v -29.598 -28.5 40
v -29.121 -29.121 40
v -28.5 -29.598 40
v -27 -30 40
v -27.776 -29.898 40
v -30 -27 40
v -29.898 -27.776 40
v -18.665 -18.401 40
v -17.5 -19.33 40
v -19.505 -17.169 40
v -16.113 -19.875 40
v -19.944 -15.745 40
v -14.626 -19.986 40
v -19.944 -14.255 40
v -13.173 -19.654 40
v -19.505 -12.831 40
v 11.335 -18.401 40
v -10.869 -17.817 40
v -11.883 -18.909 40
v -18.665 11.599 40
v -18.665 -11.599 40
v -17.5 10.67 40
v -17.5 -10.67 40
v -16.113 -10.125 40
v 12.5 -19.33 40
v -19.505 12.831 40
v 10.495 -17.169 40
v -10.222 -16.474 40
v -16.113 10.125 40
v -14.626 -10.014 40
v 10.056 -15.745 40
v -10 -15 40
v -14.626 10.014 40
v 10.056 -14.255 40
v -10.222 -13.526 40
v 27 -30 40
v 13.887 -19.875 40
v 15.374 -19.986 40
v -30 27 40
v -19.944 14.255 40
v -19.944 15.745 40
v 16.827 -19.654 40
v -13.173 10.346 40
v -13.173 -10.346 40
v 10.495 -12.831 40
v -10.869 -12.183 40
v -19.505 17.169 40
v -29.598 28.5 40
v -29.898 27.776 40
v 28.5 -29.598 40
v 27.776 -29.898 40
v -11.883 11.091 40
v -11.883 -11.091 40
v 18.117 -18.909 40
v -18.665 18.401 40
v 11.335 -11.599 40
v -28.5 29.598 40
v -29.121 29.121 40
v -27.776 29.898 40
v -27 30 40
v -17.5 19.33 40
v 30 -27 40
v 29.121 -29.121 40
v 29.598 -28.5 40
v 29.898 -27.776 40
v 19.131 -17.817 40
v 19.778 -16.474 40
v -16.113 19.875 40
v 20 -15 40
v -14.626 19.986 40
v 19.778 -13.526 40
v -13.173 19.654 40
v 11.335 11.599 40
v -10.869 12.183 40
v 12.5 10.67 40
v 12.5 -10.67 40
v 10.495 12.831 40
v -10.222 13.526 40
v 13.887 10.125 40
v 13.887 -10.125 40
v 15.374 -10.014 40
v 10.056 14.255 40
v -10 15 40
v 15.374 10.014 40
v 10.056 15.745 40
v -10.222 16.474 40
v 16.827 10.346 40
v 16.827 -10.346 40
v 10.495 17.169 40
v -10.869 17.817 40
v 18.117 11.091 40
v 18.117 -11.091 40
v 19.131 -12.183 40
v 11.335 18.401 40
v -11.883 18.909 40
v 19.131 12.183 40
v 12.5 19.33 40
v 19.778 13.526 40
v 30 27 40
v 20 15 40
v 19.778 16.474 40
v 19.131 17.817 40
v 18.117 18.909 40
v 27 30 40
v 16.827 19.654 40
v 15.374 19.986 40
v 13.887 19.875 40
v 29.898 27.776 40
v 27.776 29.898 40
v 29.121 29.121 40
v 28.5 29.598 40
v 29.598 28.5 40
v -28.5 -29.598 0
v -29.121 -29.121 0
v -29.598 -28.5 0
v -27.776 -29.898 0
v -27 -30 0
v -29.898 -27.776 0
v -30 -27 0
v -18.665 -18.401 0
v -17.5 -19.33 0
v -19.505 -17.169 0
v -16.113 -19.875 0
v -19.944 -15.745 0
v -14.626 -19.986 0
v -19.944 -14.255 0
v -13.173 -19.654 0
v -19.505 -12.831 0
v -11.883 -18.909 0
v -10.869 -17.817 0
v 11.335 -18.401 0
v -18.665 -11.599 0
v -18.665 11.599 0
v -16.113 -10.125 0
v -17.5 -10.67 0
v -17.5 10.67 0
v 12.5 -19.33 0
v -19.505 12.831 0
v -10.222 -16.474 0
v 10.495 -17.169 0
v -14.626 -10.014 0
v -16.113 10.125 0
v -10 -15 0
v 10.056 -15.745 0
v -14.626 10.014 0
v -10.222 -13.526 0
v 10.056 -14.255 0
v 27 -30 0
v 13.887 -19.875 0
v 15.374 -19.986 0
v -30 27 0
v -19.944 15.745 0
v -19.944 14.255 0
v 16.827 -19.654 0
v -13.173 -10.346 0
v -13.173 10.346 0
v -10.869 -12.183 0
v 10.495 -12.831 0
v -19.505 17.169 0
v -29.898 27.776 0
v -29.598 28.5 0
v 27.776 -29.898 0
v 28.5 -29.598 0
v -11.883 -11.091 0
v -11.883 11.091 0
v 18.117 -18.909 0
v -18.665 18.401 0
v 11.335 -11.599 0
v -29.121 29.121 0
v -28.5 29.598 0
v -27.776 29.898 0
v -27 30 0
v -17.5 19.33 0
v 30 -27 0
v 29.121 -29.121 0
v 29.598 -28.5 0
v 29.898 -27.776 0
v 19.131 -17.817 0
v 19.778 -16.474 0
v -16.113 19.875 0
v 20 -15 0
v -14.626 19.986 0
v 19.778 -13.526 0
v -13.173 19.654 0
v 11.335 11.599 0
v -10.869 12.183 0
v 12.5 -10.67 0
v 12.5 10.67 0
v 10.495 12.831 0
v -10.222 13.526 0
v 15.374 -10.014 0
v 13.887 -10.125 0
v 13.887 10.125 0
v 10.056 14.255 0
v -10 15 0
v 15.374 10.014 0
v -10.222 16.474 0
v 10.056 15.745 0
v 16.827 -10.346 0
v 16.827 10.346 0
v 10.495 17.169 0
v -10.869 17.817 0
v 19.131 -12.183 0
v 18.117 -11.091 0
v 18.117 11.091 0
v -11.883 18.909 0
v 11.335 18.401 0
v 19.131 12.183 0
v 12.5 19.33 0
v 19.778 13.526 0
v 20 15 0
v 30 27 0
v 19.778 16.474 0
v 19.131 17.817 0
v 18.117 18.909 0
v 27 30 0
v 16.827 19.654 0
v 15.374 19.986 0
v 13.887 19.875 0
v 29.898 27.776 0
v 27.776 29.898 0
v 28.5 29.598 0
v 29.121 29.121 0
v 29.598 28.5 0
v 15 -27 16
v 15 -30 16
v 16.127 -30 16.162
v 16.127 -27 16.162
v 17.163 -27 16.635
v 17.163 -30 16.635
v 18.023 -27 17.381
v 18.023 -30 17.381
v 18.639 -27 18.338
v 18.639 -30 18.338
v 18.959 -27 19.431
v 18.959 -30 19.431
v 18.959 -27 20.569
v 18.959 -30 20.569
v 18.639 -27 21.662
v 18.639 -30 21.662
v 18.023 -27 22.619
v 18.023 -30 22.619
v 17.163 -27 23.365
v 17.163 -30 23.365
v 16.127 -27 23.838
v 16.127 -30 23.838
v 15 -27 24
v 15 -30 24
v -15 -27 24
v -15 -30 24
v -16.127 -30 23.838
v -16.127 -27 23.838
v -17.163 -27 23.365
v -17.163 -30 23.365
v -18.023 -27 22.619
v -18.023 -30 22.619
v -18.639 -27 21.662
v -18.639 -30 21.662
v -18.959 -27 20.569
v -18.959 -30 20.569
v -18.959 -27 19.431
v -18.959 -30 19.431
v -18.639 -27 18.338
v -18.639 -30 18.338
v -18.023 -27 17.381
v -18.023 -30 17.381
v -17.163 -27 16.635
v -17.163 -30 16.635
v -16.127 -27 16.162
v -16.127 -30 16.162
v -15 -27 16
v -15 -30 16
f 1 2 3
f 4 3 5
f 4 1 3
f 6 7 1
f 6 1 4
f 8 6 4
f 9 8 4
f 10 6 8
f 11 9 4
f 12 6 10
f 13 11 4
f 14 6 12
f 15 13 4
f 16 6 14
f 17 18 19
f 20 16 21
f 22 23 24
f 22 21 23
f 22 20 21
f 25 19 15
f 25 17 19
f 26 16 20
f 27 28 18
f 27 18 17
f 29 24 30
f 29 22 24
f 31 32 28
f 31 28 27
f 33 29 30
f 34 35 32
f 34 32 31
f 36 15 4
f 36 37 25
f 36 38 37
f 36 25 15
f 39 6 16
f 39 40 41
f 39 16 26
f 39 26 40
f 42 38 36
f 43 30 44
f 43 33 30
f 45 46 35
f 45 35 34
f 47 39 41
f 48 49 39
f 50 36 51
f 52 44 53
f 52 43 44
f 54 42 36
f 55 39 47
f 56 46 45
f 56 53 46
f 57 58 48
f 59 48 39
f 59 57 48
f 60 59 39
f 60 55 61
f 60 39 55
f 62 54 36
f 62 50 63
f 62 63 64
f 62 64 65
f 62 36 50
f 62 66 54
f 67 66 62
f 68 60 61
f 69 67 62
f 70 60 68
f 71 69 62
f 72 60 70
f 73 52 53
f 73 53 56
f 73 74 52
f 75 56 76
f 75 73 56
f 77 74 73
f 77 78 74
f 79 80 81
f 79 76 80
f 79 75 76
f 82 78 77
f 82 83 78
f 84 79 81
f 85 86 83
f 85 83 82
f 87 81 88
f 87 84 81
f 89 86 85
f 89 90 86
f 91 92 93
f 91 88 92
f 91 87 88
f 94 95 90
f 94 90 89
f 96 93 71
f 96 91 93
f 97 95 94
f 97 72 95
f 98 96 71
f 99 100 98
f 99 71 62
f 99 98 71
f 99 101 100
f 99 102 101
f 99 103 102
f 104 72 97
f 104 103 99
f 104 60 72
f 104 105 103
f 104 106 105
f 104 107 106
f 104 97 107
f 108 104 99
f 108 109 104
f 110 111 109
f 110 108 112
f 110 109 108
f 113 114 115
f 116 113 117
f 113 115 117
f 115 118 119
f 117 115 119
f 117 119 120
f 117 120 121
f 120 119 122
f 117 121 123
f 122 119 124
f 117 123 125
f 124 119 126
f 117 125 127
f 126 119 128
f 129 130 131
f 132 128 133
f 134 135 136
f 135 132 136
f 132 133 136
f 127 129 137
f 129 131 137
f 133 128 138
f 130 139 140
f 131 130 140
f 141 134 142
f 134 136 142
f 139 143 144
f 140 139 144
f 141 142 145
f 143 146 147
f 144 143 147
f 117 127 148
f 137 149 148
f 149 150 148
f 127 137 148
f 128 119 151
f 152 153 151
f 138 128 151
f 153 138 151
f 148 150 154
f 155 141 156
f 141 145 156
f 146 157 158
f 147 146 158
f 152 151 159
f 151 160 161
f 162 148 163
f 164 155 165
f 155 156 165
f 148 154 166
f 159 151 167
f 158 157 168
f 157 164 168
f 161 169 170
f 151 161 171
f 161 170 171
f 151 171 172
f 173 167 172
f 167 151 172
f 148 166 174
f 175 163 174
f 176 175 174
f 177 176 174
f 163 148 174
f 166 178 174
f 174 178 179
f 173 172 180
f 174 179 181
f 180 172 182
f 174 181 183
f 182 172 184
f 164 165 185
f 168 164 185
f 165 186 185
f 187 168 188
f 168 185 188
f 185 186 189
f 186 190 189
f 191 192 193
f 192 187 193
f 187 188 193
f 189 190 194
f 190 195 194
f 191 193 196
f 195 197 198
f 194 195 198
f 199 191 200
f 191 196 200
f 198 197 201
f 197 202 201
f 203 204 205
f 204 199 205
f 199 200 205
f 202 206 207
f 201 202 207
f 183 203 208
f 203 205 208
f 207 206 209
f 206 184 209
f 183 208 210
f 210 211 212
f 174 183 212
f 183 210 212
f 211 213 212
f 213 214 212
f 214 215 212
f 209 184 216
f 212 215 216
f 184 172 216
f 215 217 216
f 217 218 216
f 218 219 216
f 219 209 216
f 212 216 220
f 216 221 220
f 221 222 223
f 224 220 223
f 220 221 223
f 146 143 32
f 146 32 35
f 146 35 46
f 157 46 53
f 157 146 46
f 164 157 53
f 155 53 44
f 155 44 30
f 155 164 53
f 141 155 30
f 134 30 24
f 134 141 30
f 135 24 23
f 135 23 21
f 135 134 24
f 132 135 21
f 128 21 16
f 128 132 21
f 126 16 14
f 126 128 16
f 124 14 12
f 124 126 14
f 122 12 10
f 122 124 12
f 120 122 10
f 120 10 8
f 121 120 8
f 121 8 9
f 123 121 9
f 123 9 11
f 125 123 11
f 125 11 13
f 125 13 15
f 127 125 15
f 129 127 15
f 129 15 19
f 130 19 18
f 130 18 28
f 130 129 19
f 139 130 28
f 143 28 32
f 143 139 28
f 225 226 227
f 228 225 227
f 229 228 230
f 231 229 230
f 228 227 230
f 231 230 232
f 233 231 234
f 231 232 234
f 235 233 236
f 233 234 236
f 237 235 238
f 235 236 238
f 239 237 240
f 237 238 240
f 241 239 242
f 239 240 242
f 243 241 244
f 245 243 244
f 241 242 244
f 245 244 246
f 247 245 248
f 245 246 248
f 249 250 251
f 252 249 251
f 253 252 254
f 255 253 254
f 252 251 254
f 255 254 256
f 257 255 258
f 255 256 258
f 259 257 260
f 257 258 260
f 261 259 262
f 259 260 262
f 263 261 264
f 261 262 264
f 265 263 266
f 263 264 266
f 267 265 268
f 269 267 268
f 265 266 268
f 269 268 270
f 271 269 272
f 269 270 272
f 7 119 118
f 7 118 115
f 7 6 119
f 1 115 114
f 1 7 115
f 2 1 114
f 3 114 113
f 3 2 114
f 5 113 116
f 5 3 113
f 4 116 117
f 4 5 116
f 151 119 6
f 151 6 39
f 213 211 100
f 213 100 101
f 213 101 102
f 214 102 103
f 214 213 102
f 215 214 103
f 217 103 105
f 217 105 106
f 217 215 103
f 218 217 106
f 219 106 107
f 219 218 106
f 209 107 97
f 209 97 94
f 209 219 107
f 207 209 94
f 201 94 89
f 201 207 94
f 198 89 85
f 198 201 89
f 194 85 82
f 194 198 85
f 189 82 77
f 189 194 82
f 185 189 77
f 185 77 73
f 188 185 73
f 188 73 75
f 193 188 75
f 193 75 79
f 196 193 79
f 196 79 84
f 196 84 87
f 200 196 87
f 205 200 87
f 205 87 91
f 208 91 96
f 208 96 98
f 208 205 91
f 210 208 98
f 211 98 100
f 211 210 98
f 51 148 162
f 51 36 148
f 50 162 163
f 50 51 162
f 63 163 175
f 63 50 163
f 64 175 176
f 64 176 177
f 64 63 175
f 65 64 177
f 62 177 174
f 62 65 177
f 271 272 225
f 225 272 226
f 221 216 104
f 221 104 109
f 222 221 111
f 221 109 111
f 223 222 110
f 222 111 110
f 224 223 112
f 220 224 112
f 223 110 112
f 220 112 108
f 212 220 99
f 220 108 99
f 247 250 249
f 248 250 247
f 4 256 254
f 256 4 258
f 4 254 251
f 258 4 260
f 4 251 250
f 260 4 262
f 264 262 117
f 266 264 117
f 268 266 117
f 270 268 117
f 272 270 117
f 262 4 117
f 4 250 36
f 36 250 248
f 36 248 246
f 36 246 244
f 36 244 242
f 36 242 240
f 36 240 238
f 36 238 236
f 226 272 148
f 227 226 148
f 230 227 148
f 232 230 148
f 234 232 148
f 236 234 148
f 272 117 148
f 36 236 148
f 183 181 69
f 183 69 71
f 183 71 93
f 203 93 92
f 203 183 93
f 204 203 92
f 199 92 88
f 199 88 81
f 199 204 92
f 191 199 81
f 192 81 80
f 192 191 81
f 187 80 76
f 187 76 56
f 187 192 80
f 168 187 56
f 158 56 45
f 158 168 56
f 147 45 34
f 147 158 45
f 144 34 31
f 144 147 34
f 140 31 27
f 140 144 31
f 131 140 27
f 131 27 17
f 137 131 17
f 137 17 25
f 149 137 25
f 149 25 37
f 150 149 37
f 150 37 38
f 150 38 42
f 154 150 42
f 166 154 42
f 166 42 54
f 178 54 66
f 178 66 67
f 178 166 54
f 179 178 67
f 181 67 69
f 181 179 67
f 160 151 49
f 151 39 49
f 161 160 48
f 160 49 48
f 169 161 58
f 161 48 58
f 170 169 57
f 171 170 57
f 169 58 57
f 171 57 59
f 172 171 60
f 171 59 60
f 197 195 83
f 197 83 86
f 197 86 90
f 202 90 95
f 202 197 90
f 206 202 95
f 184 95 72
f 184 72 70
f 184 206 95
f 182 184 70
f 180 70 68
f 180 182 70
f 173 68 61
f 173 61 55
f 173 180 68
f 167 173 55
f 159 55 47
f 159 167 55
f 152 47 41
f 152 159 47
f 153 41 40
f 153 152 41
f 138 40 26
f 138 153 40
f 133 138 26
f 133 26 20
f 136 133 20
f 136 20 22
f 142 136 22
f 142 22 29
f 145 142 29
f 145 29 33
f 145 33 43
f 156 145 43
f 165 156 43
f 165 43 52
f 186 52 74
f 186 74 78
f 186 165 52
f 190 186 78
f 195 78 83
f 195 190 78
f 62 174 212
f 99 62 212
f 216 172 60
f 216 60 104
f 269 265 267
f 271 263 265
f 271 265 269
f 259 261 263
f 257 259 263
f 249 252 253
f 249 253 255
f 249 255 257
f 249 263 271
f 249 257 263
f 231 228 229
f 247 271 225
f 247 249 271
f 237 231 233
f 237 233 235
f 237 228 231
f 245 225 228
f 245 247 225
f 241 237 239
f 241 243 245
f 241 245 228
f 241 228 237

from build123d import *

# Parameters (mm, degrees)
SKETCH_W     = 60
SKETCH_H     = 60
SKETCH_R     = 5
PAD_DEPTH    = 40
POCKET_DEPTH = 3
FILLET_R     = 3


with BuildPart() as part:
    # Sketch → Pad (new body)
    with BuildSketch(Plane.XY):
        Rectangle(SKETCH_W, SKETCH_H)
        with Locations((-15, 15)):
            Circle(SKETCH_R, mode=Mode.SUBTRACT)
        with Locations((15, 15)):
            Circle(SKETCH_R, mode=Mode.SUBTRACT)
        with Locations((-15, -15)):
            Circle(SKETCH_R, mode=Mode.SUBTRACT)
        with Locations((15, -15)):
            Circle(SKETCH_R, mode=Mode.SUBTRACT)
    extrude(amount=PAD_DEPTH)

    # Sketch001 (on Face4 of Pad) → Pocket (cut)
    with BuildSketch(Plane.XZ.offset(30)):
        with BuildLine():
            ThreePointArc((-15, 24), (-19, 20), (-15, 16))
            Line((-15, 16), (15, 16))
            ThreePointArc((15, 16), (19, 20), (15, 24))
            Line((-15, 24), (15, 24))
        make_face()
    extrude(amount=-POCKET_DEPTH, mode=Mode.SUBTRACT)

    # Fillet
    fillet_edges = [part.edges().sort_by_distance(p)[0] for p in [
        (30, -30, 20),
        (30, 30, 20),
        (-30, -30, 20),
        (-30, 30, 20),
    ]]
    fillet(fillet_edges, radius=FILLET_R)


solid = part.part
